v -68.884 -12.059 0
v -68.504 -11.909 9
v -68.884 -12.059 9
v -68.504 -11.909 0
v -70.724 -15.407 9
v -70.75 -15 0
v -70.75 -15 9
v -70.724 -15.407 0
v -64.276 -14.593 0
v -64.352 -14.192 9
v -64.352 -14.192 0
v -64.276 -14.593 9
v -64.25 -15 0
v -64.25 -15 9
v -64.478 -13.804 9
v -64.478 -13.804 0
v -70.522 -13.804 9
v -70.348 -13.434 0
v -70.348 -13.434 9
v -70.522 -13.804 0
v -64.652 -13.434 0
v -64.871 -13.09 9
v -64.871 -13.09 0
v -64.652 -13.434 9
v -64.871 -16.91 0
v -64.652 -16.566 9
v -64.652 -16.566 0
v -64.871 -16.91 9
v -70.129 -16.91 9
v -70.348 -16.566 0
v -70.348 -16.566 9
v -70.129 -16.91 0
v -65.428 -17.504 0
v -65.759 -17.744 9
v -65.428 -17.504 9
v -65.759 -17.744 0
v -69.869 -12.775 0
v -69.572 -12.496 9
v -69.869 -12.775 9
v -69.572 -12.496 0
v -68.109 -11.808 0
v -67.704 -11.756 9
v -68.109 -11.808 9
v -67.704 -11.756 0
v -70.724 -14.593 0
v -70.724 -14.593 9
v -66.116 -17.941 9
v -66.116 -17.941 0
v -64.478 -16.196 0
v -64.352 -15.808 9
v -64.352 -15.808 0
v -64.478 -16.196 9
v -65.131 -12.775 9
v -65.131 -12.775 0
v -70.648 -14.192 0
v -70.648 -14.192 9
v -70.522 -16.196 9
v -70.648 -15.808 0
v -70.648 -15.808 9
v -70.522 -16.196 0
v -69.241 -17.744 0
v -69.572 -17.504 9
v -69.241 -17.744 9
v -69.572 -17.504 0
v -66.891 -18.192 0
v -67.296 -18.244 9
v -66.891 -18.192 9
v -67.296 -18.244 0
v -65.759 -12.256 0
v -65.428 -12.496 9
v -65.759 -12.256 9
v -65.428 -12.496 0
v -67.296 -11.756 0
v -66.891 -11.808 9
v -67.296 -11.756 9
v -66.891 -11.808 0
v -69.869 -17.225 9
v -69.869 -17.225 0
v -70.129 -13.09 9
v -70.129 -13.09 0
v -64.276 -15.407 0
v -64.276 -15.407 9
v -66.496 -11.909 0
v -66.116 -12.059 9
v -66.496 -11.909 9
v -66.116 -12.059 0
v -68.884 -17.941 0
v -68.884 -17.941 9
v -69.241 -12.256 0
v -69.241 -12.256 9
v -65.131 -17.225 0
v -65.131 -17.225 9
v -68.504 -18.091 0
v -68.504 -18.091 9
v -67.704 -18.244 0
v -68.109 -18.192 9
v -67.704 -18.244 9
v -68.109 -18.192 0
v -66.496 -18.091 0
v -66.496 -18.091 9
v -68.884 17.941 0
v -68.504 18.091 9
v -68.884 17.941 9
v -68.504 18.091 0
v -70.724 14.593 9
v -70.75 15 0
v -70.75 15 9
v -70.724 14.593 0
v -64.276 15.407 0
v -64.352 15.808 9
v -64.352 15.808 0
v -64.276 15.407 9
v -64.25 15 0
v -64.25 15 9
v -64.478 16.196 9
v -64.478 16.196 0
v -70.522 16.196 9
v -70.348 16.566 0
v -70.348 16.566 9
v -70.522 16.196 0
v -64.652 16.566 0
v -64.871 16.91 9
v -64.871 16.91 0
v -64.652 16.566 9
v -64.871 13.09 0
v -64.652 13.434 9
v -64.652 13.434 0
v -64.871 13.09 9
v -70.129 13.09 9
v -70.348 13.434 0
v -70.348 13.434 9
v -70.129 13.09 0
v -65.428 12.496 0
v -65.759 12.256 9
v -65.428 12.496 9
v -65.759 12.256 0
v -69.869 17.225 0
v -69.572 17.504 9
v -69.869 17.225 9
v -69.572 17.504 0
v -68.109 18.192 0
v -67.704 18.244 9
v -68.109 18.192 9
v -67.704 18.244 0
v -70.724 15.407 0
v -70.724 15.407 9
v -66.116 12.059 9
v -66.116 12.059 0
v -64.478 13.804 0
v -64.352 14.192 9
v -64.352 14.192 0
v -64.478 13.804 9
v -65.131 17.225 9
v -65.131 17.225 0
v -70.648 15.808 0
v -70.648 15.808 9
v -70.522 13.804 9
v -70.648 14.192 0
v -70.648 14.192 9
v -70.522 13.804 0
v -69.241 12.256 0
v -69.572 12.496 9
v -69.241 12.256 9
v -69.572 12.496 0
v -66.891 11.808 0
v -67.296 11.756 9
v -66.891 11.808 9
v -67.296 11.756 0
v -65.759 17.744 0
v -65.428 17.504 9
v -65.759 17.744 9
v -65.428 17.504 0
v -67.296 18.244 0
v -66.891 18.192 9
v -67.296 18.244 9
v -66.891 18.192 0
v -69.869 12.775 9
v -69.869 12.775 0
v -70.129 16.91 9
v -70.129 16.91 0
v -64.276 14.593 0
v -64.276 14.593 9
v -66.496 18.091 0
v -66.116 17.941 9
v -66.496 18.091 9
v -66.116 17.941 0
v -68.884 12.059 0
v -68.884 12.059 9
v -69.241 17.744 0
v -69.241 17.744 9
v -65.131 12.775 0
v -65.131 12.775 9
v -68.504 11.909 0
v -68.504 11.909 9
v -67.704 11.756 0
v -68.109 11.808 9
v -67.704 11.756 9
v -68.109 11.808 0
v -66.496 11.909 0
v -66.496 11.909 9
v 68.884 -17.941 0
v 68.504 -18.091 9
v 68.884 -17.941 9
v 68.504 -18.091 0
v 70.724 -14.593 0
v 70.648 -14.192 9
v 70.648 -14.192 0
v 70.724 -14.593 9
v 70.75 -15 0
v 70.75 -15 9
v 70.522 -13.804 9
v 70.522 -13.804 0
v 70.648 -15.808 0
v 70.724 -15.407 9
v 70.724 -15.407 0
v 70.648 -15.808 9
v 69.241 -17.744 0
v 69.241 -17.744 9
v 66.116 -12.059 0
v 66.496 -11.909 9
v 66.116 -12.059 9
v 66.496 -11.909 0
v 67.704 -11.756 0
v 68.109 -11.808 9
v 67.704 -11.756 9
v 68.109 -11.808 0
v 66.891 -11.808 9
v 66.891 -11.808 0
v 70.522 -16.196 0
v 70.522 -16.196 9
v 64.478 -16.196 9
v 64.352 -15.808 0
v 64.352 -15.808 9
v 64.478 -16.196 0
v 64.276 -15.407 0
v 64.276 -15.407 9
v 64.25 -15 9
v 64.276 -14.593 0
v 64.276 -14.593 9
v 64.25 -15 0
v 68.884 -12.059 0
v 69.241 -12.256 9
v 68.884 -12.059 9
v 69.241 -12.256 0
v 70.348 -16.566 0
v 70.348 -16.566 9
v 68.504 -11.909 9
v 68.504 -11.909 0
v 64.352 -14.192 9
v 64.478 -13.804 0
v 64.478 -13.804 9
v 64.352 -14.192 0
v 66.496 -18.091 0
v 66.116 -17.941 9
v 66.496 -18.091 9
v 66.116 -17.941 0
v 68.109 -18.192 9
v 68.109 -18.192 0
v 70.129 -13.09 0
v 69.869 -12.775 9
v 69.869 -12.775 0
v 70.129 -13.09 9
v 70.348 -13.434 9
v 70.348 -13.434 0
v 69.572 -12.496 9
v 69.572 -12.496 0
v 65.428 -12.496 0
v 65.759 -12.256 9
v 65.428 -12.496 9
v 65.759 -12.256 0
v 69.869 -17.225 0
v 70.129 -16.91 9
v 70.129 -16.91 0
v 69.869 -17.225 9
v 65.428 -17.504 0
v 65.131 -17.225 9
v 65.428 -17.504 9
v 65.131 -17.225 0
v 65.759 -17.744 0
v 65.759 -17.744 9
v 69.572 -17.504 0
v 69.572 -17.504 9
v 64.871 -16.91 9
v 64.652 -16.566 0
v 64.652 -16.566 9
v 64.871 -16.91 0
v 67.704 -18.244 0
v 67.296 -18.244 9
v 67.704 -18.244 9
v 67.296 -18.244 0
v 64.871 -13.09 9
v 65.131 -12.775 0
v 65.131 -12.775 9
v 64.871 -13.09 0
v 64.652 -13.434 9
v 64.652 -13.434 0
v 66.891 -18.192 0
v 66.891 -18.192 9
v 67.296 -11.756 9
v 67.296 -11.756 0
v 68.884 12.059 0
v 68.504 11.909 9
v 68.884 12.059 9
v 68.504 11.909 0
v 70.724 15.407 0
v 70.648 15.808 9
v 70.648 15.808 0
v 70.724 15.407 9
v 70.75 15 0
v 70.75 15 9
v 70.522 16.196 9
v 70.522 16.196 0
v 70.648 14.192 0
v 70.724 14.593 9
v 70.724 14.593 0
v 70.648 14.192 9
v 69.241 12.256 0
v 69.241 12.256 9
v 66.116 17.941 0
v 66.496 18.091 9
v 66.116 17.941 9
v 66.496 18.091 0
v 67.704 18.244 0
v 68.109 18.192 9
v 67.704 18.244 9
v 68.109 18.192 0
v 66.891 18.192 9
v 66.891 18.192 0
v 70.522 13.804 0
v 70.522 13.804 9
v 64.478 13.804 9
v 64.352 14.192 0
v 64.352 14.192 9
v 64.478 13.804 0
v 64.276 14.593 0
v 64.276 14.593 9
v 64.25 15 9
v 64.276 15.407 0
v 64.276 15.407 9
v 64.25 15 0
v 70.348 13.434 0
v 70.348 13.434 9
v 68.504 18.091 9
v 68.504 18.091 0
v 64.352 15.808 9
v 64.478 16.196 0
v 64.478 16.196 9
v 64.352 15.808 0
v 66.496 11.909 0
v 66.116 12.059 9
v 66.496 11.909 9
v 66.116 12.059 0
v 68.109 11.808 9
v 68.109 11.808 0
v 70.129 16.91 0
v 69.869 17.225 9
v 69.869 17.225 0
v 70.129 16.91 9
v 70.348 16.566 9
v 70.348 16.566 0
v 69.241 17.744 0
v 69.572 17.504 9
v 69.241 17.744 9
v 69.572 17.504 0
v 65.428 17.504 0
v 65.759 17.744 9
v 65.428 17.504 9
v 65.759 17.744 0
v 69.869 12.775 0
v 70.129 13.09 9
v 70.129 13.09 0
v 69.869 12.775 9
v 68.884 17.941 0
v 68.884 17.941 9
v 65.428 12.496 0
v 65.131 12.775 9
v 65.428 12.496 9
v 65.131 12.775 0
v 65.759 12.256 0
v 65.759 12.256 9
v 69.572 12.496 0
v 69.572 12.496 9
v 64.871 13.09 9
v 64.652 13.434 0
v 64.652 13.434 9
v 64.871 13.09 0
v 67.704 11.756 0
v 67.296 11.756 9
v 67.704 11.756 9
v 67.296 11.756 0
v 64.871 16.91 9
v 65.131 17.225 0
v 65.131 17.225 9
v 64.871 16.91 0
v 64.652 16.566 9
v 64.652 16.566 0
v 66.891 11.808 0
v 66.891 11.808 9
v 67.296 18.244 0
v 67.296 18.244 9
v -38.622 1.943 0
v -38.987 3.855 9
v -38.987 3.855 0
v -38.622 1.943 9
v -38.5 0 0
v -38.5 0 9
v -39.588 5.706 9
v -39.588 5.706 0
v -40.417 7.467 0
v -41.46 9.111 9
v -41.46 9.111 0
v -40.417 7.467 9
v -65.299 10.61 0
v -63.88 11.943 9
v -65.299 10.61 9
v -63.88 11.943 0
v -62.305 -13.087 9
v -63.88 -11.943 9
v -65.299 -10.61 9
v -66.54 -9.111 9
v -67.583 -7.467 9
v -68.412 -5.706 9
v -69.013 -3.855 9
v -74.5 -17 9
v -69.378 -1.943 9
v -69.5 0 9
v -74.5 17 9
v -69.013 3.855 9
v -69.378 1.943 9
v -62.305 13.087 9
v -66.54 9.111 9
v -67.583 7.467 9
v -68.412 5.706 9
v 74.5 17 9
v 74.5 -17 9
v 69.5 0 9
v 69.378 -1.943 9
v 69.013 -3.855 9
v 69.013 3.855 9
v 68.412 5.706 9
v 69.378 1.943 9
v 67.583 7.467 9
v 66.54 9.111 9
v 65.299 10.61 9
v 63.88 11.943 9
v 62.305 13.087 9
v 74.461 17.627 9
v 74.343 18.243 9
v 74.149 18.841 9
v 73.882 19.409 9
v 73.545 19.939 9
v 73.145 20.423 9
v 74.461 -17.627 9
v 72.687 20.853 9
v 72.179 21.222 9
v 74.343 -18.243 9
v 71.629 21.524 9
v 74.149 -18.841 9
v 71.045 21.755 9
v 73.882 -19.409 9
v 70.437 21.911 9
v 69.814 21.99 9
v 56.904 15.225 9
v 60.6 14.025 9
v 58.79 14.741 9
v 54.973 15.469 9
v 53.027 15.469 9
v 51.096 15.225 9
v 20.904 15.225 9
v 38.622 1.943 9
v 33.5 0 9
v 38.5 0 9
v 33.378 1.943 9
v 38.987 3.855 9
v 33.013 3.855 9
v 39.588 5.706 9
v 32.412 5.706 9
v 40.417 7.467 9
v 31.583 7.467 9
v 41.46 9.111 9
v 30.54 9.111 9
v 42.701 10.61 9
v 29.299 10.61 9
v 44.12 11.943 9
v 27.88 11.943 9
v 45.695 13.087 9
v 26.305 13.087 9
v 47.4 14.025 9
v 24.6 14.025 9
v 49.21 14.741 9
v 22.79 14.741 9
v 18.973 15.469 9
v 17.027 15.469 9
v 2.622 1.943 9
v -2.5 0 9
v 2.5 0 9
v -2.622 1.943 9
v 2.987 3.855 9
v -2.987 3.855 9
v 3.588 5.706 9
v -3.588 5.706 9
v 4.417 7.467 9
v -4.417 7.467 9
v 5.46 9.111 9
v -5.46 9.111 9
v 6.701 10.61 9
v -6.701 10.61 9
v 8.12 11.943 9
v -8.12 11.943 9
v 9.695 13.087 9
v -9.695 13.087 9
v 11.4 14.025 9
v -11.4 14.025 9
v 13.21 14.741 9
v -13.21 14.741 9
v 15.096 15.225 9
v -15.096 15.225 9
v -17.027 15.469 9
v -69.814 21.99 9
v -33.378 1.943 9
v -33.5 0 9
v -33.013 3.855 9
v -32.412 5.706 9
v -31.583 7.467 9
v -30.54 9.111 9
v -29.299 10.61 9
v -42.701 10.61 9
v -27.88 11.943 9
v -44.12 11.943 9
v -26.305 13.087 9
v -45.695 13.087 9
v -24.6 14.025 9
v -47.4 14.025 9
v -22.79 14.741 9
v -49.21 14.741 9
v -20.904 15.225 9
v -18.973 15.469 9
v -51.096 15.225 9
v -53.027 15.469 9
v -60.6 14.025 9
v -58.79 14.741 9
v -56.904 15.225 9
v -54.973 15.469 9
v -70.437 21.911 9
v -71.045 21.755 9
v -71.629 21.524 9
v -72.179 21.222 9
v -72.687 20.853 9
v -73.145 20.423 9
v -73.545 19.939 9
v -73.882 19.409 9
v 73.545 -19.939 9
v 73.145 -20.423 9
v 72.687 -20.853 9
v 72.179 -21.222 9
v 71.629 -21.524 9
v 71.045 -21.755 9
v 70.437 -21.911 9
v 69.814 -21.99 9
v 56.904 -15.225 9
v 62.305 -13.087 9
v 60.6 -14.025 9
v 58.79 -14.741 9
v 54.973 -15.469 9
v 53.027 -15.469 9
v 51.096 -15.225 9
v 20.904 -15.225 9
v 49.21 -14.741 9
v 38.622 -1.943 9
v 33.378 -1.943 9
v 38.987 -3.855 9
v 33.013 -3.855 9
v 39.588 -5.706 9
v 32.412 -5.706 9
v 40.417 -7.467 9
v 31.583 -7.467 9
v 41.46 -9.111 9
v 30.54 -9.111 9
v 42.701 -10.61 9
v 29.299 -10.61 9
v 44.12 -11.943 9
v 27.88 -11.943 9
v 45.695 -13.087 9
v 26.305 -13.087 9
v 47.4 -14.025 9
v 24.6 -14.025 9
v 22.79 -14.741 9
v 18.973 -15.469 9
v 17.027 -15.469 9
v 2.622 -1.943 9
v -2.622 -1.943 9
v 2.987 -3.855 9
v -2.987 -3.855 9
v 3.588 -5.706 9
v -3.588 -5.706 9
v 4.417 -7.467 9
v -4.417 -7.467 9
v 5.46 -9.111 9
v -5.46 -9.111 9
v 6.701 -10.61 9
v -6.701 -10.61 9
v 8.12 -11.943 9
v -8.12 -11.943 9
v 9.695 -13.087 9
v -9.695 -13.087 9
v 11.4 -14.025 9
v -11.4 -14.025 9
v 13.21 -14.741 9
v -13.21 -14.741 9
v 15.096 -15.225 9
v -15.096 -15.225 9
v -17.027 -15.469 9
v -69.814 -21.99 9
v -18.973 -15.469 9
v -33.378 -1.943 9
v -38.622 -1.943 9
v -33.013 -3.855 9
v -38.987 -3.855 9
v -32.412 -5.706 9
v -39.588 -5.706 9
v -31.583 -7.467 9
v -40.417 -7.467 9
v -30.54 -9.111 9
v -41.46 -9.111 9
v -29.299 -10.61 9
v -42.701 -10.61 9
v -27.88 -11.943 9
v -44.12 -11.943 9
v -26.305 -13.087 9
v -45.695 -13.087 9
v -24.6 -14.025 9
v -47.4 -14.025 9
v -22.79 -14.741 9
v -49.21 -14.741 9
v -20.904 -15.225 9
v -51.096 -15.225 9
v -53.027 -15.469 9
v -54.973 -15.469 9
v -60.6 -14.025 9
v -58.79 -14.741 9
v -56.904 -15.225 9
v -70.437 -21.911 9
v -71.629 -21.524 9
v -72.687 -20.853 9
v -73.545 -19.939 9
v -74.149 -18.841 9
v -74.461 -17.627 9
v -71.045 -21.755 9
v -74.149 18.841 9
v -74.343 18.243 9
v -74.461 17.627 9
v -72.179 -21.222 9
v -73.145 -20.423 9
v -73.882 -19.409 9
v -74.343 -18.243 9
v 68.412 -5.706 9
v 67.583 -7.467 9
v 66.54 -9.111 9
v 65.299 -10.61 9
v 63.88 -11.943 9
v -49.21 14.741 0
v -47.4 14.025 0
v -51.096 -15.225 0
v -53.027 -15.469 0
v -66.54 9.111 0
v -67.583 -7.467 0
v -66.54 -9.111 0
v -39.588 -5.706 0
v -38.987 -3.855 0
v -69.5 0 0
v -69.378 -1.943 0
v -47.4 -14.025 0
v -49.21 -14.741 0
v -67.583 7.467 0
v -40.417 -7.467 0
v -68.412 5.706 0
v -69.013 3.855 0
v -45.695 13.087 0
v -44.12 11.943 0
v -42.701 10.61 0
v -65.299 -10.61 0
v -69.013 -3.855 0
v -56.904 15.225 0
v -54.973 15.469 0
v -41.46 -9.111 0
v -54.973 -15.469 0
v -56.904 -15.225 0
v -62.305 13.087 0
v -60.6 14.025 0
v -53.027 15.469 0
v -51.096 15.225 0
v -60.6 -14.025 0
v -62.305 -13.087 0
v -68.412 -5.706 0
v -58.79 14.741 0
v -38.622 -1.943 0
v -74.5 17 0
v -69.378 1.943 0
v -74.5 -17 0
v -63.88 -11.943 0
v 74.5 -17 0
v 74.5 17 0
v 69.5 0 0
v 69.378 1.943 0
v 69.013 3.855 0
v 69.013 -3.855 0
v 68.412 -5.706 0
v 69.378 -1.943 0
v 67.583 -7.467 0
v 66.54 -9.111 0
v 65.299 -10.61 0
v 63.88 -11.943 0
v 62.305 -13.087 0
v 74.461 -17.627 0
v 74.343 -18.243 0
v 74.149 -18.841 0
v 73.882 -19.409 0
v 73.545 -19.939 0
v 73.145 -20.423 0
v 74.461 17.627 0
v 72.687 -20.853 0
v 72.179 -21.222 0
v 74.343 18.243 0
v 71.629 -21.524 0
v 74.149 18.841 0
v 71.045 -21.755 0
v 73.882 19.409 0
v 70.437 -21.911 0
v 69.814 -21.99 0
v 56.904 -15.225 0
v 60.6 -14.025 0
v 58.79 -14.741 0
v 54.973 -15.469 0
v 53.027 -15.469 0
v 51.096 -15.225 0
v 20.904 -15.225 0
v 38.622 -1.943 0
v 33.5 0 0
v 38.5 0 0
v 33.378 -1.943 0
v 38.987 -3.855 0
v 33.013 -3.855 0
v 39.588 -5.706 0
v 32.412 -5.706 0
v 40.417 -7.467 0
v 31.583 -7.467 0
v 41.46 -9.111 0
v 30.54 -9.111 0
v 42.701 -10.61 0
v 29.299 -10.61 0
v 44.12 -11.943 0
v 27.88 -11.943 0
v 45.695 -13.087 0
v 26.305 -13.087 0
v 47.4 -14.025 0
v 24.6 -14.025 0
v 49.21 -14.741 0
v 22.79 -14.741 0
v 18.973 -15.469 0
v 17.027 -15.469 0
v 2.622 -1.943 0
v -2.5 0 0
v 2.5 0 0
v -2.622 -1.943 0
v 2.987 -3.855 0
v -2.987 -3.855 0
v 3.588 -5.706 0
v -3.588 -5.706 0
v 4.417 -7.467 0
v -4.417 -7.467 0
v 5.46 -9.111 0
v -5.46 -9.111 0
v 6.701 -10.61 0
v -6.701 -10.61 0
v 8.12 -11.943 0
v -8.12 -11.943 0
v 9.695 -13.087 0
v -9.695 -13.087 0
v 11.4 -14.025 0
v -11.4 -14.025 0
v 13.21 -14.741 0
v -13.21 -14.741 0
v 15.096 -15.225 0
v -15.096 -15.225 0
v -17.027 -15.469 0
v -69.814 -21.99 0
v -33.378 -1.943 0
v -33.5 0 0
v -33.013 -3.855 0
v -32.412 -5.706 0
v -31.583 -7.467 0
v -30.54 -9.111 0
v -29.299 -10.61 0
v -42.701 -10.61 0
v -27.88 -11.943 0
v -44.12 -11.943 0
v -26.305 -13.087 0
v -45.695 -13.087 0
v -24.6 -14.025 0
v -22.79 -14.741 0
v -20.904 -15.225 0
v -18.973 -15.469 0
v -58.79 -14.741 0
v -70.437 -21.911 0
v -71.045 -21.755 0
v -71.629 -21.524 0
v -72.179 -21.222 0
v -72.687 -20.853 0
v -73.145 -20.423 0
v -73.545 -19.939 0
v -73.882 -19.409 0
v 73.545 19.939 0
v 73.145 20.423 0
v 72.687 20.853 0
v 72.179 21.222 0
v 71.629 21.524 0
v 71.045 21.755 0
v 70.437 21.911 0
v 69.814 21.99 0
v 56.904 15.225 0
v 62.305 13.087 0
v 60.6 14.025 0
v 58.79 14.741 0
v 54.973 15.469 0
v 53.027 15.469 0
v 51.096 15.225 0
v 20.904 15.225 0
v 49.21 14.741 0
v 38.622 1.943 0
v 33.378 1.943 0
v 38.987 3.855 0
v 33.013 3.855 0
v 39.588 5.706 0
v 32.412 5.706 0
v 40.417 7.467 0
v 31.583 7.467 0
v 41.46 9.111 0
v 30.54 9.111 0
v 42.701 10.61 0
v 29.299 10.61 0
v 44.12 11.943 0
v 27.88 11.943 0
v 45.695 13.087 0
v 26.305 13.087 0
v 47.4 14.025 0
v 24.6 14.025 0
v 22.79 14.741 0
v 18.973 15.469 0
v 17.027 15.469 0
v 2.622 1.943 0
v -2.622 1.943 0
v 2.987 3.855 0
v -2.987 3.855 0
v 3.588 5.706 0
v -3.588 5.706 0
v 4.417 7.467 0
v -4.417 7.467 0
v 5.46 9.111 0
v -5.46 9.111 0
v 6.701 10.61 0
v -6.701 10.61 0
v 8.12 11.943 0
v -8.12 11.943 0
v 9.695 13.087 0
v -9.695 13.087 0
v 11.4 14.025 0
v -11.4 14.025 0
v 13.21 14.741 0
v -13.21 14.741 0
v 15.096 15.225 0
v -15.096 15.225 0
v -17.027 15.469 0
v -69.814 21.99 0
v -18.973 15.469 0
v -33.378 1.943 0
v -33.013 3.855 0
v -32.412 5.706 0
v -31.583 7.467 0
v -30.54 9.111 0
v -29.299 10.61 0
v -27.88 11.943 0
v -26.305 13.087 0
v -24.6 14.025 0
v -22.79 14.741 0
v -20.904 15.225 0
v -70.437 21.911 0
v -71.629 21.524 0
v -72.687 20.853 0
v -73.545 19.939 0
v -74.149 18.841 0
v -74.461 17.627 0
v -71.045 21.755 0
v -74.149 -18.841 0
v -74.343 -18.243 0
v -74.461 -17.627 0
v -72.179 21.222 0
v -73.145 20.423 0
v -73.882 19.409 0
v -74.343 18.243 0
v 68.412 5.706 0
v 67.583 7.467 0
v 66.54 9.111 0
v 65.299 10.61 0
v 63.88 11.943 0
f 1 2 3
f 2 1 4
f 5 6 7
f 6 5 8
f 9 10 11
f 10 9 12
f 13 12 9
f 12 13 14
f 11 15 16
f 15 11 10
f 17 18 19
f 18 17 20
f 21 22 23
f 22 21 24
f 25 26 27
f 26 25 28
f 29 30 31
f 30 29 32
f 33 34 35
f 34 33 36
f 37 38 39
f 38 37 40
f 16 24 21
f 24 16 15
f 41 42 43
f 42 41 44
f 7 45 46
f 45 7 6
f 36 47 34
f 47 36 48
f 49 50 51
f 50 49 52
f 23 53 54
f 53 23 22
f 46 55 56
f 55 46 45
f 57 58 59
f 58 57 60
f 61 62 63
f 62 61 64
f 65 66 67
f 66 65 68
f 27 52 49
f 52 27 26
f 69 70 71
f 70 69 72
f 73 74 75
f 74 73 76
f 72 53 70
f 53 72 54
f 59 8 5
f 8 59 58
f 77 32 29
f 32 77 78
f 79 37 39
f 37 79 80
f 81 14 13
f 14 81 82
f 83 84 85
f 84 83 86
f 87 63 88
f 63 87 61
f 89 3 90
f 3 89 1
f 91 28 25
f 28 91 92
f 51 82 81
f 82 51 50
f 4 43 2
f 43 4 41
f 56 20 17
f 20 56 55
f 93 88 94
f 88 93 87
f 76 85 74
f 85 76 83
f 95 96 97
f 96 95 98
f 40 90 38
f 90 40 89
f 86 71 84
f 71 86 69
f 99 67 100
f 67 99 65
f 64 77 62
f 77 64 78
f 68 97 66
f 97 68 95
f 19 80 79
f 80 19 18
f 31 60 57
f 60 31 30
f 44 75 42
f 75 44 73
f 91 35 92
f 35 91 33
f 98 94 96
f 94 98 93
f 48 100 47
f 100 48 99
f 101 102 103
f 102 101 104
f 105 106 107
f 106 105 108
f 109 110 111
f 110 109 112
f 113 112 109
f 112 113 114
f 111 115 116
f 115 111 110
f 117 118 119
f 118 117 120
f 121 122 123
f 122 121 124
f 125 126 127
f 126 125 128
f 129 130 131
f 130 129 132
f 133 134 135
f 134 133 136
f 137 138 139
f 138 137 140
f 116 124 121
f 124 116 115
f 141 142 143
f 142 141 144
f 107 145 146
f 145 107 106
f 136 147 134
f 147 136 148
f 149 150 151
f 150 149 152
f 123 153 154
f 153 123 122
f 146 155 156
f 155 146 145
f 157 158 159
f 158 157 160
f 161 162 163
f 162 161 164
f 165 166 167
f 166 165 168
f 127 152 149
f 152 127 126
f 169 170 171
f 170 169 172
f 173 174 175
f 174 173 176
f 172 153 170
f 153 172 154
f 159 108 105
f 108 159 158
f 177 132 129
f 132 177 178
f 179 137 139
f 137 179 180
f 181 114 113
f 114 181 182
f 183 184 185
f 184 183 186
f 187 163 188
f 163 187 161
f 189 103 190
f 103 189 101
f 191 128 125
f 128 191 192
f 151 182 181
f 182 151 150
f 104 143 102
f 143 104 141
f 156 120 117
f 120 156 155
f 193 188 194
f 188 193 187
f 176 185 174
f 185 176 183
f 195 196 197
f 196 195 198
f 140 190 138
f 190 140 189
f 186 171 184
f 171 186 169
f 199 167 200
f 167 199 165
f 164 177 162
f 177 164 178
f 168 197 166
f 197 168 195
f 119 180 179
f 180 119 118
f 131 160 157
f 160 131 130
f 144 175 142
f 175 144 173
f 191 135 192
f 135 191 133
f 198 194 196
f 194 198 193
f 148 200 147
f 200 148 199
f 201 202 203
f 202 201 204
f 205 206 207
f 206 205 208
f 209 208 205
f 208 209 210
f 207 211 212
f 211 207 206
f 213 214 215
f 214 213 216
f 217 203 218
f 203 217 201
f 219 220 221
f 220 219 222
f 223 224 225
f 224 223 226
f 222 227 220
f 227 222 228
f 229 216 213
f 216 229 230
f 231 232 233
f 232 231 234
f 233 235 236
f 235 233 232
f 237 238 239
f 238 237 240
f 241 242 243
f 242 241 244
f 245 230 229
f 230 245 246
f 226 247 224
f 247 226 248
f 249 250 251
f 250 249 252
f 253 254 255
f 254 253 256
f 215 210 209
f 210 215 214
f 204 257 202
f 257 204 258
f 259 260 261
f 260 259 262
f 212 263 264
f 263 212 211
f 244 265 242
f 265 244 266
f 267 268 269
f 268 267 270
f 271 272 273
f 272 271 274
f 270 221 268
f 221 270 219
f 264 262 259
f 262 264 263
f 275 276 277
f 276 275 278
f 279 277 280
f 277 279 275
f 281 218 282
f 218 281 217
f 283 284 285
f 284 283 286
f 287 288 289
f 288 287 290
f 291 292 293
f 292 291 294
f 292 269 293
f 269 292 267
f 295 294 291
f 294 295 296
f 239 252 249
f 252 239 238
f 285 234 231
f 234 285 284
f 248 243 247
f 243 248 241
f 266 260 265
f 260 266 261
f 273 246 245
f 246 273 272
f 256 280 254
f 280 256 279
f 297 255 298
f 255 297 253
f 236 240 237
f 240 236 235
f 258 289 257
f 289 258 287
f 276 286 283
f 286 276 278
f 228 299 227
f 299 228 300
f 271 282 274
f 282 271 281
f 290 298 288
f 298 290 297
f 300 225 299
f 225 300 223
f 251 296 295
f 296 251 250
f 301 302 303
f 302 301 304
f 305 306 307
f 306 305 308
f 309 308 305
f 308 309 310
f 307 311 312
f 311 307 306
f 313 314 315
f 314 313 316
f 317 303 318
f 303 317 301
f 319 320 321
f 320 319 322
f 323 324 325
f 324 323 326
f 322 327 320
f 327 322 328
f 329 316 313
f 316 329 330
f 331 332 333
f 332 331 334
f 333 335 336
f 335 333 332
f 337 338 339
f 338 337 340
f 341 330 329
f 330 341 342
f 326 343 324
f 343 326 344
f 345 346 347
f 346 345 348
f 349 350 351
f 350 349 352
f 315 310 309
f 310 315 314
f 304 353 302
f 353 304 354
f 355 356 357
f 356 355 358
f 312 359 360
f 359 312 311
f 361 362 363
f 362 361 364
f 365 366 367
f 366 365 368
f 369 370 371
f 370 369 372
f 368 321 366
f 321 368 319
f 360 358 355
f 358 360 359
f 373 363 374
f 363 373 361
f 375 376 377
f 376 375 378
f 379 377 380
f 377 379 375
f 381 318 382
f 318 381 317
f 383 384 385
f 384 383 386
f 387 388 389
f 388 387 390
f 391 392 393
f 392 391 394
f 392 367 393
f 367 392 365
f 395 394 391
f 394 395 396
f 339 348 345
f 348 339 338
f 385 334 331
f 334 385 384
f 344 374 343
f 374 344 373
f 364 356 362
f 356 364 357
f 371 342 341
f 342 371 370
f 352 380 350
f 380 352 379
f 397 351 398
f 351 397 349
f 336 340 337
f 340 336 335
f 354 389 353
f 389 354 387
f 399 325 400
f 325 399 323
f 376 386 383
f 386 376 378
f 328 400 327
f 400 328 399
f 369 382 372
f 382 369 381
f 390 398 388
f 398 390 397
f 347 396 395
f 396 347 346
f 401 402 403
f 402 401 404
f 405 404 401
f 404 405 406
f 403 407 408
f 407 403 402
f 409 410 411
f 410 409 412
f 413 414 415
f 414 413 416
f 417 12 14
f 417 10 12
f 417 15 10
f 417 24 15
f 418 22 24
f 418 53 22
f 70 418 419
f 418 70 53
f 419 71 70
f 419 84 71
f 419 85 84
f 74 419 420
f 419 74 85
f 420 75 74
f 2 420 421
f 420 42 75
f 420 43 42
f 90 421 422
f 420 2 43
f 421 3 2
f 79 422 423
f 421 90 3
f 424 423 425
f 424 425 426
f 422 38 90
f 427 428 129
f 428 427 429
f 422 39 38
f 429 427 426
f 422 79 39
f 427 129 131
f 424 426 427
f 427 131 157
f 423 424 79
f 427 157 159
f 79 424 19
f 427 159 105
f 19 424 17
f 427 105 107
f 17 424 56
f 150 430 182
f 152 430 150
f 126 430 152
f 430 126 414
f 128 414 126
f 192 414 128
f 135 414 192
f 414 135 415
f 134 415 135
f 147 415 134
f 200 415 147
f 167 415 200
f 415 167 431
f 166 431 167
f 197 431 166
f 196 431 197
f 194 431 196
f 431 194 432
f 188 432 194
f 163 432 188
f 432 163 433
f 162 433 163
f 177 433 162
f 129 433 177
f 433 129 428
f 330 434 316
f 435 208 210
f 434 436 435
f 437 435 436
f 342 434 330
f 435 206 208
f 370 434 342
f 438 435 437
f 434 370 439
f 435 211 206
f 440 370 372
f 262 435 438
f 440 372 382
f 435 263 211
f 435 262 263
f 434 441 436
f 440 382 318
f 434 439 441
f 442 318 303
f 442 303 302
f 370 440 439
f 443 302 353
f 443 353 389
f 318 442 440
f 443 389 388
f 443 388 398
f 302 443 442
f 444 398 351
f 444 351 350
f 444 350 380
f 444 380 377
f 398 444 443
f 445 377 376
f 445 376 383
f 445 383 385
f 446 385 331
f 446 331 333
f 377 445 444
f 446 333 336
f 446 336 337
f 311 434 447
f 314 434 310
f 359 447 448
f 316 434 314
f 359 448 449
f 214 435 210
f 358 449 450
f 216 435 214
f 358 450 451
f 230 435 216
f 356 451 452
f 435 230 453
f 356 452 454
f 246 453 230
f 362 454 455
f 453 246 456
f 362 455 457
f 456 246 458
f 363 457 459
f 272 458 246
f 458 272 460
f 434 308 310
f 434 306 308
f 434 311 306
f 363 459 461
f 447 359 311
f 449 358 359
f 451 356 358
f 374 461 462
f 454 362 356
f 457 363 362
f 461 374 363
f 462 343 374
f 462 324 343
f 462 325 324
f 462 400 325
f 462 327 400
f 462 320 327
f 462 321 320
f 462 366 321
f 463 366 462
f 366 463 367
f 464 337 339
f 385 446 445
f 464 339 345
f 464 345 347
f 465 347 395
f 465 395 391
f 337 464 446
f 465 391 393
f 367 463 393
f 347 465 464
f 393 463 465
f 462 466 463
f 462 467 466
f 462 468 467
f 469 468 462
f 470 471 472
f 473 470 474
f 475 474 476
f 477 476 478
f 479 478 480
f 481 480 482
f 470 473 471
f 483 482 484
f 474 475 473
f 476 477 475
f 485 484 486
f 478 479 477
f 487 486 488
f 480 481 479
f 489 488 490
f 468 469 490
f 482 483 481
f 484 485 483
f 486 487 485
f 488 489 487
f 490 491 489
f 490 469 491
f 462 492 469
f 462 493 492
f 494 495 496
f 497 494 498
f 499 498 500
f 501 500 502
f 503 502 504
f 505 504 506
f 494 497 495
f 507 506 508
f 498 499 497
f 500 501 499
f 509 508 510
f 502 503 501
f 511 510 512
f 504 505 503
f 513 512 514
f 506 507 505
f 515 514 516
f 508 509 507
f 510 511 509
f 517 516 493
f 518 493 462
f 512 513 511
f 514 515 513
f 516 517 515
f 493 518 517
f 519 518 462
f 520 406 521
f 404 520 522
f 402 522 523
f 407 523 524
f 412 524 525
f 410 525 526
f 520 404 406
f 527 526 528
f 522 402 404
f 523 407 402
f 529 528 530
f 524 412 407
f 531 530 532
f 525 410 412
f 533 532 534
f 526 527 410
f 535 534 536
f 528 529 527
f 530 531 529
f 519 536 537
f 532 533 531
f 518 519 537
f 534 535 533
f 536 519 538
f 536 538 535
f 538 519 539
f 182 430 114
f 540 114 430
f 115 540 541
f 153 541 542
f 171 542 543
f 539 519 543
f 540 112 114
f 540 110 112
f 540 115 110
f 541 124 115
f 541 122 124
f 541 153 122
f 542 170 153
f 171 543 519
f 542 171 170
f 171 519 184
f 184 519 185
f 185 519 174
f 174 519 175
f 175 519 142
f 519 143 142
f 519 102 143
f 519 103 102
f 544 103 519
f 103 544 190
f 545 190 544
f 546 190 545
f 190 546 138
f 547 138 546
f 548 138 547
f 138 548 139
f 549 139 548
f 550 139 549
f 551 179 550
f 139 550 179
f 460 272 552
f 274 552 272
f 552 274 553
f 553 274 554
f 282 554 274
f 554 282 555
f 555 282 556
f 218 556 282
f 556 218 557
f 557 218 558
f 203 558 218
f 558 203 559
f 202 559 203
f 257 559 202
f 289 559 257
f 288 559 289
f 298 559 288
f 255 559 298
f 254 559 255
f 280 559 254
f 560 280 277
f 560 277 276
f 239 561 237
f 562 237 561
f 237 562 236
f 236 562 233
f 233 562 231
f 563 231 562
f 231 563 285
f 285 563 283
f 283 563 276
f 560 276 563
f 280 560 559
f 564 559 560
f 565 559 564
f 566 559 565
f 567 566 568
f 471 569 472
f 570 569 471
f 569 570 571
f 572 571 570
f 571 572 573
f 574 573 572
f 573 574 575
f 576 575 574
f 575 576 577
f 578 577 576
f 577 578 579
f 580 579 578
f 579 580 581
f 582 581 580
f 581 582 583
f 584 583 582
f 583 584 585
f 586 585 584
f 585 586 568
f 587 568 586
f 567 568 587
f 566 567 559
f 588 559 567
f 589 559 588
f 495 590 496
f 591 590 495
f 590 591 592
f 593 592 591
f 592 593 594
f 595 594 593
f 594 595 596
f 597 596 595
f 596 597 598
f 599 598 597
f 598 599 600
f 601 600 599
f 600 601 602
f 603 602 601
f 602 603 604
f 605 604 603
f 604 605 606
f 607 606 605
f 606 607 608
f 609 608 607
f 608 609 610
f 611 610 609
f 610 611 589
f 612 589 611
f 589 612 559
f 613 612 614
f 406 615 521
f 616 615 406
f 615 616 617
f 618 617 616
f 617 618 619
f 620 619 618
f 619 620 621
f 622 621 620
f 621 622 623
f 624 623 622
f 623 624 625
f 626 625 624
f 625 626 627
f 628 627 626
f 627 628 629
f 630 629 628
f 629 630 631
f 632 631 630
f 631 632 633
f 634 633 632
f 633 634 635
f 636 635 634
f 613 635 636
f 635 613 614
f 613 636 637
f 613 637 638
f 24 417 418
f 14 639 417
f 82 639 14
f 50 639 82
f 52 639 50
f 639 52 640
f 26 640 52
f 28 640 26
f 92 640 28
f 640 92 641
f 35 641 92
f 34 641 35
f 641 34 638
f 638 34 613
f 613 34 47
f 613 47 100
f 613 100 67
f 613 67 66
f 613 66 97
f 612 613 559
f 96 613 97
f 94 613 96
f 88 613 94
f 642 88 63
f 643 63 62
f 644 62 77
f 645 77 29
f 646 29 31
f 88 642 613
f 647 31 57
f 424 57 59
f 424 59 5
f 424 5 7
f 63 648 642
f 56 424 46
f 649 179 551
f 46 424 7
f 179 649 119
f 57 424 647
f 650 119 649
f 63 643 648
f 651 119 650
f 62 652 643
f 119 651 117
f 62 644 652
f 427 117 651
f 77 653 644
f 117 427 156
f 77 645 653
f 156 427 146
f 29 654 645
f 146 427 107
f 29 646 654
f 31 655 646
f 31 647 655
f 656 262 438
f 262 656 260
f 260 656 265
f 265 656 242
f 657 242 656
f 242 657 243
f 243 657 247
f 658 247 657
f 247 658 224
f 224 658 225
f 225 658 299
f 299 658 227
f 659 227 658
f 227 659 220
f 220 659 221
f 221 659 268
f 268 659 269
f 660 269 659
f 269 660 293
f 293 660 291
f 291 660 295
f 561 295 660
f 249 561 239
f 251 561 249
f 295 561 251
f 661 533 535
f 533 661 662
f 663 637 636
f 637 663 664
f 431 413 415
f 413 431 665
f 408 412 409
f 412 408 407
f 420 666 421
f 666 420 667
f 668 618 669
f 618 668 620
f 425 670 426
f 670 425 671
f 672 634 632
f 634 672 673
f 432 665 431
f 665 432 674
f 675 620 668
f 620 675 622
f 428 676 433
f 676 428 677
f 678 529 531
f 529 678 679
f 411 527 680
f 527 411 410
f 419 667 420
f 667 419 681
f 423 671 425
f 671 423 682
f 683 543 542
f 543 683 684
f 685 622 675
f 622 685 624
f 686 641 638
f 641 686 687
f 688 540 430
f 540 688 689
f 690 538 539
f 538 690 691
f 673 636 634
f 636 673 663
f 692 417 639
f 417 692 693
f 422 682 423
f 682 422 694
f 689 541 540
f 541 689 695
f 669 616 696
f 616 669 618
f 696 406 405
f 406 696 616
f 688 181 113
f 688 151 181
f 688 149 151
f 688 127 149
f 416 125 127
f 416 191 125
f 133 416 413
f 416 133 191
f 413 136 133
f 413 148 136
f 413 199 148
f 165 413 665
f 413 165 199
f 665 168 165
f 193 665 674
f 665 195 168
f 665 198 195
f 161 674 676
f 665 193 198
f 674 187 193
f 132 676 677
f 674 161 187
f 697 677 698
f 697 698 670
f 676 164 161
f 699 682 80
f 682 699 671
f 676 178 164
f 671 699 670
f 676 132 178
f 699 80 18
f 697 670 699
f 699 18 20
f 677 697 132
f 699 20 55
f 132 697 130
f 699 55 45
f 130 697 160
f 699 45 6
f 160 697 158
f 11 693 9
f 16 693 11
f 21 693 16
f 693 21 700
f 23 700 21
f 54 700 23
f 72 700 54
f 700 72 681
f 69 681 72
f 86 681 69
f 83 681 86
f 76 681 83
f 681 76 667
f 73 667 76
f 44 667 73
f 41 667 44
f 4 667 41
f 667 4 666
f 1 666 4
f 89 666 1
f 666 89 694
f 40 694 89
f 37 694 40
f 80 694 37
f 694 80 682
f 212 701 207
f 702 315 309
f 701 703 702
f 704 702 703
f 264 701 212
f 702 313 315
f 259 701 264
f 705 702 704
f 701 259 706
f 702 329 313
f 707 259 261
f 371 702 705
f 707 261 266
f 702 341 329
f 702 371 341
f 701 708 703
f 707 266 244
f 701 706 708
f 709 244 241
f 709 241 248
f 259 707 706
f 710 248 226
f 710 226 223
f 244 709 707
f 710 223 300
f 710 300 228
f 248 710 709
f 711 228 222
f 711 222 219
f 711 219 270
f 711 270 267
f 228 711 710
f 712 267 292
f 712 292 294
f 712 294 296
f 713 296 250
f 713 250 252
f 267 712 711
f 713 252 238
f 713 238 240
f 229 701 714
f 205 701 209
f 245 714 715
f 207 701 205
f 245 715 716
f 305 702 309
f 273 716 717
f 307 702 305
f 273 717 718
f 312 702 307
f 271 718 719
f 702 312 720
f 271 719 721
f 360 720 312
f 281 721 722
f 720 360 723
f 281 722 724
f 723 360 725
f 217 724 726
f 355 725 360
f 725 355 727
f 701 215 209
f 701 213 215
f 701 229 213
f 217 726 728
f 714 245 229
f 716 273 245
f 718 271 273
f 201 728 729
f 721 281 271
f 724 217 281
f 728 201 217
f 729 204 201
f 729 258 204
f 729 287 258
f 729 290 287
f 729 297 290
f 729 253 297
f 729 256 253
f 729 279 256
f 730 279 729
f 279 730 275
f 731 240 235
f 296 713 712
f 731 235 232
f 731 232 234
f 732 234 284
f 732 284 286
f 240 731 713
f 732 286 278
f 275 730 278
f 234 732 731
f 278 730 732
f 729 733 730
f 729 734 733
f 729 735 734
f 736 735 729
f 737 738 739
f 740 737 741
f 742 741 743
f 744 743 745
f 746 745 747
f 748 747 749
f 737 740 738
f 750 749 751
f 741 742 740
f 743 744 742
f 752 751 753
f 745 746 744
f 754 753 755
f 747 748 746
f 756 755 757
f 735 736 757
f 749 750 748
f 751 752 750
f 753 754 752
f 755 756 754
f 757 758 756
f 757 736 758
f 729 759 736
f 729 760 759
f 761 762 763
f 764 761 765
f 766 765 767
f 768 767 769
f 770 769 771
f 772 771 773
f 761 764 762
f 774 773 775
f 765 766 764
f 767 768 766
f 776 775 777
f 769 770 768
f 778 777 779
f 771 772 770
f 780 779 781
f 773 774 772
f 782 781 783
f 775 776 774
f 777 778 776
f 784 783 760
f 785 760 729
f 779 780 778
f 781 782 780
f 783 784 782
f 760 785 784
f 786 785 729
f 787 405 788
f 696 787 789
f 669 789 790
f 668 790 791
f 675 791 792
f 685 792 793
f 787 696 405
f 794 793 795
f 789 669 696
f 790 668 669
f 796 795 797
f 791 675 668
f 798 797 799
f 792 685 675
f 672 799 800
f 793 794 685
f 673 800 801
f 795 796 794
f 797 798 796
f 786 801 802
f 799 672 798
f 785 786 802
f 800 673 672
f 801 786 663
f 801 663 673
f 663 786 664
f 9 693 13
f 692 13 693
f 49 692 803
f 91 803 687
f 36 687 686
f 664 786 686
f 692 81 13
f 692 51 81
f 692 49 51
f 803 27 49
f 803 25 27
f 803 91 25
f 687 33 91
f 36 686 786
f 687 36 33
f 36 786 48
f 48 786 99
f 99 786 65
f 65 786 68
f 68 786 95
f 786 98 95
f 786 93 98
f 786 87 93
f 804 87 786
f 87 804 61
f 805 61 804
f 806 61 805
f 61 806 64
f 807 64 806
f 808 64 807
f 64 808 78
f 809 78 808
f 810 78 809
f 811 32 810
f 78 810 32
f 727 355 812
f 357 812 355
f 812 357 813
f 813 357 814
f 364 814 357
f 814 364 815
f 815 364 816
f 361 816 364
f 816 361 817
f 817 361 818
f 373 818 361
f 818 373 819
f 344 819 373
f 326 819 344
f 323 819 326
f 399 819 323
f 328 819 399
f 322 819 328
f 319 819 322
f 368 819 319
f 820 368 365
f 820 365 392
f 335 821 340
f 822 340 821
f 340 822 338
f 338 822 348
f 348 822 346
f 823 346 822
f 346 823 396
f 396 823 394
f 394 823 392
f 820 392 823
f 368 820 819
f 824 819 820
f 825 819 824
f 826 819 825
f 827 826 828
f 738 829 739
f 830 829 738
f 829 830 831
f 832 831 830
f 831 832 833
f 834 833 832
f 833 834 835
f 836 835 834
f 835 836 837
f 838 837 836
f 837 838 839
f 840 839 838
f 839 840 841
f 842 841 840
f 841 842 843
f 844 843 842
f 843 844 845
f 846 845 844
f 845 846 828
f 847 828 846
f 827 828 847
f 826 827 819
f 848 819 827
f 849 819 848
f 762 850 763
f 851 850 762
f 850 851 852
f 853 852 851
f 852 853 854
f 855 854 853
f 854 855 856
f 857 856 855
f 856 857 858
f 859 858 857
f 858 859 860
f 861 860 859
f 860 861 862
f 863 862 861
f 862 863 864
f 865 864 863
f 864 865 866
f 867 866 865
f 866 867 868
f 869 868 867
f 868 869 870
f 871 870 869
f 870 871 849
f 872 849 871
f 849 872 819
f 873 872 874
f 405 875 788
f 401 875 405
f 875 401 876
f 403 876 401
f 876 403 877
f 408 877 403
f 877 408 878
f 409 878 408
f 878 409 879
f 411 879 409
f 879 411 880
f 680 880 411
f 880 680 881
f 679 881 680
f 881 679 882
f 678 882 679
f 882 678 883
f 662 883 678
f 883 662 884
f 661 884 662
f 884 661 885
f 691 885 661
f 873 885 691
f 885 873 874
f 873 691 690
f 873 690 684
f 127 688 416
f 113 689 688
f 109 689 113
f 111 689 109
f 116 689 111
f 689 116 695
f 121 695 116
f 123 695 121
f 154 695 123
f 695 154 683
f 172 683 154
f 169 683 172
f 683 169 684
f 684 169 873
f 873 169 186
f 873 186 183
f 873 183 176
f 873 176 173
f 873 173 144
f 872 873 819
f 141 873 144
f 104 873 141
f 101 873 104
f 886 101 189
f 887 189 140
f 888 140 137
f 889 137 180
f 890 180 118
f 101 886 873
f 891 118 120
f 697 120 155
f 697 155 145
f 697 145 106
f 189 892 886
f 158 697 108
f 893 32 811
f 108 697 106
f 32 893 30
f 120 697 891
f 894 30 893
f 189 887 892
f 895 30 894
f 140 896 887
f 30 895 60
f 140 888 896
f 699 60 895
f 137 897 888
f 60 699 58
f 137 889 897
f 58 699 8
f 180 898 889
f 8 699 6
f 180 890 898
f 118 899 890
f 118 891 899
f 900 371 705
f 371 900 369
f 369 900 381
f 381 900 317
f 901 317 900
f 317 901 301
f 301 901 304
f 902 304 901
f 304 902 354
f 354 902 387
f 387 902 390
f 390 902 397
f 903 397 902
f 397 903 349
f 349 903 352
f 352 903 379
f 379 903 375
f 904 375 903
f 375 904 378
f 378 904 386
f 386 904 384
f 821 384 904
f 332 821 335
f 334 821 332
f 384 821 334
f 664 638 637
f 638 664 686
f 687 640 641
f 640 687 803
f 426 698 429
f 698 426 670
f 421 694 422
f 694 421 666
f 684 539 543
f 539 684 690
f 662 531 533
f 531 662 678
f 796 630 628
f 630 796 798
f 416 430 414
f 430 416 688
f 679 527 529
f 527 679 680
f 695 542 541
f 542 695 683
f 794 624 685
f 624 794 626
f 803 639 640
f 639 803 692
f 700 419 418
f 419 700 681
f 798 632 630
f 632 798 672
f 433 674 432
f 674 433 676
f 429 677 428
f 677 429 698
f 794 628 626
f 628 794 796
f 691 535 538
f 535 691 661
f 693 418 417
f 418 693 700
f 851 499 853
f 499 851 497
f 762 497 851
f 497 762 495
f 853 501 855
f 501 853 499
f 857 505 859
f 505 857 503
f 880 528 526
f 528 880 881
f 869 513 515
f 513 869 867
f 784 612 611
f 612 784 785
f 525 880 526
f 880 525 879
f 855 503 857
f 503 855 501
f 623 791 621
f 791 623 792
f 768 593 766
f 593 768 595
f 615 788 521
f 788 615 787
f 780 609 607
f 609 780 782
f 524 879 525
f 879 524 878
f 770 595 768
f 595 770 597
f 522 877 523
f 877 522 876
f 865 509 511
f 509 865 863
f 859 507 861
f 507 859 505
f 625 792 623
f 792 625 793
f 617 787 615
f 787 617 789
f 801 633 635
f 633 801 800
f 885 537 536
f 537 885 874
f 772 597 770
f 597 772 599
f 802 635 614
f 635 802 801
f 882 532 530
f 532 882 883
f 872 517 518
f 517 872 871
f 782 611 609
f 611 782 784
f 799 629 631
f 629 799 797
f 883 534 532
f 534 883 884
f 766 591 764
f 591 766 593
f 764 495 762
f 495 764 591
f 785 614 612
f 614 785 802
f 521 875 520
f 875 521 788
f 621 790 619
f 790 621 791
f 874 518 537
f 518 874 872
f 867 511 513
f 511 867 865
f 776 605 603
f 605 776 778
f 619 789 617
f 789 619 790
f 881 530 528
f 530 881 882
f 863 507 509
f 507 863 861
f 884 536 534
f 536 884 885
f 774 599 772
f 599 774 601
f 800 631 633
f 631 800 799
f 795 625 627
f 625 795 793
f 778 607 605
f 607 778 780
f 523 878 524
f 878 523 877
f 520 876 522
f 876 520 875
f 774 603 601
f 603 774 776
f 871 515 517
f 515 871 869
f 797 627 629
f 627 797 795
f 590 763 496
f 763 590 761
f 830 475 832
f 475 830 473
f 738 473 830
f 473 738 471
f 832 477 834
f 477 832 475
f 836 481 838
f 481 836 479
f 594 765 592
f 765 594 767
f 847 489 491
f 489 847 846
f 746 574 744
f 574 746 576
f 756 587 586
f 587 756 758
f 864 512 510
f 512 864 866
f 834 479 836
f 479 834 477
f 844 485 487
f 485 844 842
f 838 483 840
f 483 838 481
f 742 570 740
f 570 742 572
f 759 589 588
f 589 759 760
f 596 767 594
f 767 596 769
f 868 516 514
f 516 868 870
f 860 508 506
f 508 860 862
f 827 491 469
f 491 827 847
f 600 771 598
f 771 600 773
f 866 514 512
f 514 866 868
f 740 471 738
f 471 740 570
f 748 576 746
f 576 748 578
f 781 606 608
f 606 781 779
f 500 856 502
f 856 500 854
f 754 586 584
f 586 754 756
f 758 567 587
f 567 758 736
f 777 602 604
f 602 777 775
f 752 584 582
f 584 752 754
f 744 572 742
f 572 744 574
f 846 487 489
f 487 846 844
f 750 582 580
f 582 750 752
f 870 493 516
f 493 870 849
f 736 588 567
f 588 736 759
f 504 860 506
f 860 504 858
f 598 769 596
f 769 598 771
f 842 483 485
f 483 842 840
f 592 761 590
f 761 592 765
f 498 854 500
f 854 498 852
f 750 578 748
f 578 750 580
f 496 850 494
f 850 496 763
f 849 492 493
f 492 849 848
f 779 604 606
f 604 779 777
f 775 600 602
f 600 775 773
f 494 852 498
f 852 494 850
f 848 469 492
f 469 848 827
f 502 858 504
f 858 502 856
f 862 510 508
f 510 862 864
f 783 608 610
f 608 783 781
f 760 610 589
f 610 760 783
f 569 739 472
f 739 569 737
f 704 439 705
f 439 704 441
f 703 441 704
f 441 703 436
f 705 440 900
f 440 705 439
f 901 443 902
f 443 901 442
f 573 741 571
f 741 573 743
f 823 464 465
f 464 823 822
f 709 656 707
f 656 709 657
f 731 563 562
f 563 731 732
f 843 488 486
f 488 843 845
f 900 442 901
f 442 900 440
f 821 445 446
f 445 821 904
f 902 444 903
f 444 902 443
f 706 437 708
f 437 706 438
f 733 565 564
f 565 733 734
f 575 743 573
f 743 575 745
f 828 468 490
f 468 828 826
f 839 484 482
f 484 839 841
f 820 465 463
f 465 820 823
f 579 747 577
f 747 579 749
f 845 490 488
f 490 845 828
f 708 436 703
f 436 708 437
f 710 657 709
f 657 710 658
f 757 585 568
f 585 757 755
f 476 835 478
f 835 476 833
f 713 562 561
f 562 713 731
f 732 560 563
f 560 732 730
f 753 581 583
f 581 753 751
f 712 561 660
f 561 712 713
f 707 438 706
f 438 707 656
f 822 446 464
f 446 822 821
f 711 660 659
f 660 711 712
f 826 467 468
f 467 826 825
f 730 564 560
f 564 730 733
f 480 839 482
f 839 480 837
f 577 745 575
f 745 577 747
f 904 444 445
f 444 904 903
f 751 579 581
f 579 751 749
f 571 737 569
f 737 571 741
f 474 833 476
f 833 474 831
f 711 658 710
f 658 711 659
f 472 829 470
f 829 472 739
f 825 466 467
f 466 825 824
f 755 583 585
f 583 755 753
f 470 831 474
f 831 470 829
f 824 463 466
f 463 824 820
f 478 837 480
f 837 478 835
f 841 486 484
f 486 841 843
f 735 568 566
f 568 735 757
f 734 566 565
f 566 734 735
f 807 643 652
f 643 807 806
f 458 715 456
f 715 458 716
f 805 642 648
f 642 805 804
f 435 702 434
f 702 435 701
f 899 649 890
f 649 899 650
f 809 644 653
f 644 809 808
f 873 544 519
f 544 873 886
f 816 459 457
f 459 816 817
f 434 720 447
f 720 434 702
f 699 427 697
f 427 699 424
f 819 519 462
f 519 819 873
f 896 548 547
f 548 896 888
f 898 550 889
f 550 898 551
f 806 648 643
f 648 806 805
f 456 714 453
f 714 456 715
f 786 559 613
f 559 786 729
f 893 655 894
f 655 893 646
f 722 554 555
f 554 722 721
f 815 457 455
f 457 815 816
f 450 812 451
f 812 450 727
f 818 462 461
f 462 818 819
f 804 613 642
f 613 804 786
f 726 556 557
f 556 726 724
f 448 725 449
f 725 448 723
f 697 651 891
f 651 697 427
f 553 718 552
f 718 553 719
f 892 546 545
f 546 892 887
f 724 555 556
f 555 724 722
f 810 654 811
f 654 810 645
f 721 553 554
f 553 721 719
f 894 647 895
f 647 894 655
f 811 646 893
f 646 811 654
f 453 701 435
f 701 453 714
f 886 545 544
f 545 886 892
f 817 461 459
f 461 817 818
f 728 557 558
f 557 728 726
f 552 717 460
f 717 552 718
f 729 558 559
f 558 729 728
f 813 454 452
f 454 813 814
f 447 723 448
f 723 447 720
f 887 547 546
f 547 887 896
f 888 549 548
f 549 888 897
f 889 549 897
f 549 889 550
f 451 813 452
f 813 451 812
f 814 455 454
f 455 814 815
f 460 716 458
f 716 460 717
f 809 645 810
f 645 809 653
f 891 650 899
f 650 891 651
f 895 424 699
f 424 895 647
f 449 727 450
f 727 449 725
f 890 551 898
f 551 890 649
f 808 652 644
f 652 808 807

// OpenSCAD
$fn = 50;


difference() {
	union() {
		hull() {
			translate(v = [-69.5000000000, 17.0000000000, 0]) {
				cylinder(h = 9, r = 5);
			}
			translate(v = [69.5000000000, 17.0000000000, 0]) {
				cylinder(h = 9, r = 5);
			}
			translate(v = [-69.5000000000, -17.0000000000, 0]) {
				cylinder(h = 9, r = 5);
			}
			translate(v = [69.5000000000, -17.0000000000, 0]) {
				cylinder(h = 9, r = 5);
			}
		}
	}
	union() {
		#translate(v = [-67.5000000000, -15.0000000000, -100.0000000000]) {
			cylinder(h = 200, r = 3.2500000000);
		}
		#translate(v = [-67.5000000000, 15.0000000000, -100.0000000000]) {
			cylinder(h = 200, r = 3.2500000000);
		}
		#translate(v = [67.5000000000, -15.0000000000, -100.0000000000]) {
			cylinder(h = 200, r = 3.2500000000);
		}
		#translate(v = [67.5000000000, 15.0000000000, -100.0000000000]) {
			cylinder(h = 200, r = 3.2500000000);
		}
		#translate(v = [-54.0000000000, 0, 0]) {
			cylinder(h = 9, r = 15.5000000000);
		}
		#translate(v = [-18.0000000000, 0, 0]) {
			cylinder(h = 9, r = 15.5000000000);
		}
		#translate(v = [18.0000000000, 0, 0]) {
			cylinder(h = 9, r = 15.5000000000);
		}
		#translate(v = [54.0000000000, 0, 0]) {
			cylinder(h = 9, r = 15.5000000000);
		}
	}
}
